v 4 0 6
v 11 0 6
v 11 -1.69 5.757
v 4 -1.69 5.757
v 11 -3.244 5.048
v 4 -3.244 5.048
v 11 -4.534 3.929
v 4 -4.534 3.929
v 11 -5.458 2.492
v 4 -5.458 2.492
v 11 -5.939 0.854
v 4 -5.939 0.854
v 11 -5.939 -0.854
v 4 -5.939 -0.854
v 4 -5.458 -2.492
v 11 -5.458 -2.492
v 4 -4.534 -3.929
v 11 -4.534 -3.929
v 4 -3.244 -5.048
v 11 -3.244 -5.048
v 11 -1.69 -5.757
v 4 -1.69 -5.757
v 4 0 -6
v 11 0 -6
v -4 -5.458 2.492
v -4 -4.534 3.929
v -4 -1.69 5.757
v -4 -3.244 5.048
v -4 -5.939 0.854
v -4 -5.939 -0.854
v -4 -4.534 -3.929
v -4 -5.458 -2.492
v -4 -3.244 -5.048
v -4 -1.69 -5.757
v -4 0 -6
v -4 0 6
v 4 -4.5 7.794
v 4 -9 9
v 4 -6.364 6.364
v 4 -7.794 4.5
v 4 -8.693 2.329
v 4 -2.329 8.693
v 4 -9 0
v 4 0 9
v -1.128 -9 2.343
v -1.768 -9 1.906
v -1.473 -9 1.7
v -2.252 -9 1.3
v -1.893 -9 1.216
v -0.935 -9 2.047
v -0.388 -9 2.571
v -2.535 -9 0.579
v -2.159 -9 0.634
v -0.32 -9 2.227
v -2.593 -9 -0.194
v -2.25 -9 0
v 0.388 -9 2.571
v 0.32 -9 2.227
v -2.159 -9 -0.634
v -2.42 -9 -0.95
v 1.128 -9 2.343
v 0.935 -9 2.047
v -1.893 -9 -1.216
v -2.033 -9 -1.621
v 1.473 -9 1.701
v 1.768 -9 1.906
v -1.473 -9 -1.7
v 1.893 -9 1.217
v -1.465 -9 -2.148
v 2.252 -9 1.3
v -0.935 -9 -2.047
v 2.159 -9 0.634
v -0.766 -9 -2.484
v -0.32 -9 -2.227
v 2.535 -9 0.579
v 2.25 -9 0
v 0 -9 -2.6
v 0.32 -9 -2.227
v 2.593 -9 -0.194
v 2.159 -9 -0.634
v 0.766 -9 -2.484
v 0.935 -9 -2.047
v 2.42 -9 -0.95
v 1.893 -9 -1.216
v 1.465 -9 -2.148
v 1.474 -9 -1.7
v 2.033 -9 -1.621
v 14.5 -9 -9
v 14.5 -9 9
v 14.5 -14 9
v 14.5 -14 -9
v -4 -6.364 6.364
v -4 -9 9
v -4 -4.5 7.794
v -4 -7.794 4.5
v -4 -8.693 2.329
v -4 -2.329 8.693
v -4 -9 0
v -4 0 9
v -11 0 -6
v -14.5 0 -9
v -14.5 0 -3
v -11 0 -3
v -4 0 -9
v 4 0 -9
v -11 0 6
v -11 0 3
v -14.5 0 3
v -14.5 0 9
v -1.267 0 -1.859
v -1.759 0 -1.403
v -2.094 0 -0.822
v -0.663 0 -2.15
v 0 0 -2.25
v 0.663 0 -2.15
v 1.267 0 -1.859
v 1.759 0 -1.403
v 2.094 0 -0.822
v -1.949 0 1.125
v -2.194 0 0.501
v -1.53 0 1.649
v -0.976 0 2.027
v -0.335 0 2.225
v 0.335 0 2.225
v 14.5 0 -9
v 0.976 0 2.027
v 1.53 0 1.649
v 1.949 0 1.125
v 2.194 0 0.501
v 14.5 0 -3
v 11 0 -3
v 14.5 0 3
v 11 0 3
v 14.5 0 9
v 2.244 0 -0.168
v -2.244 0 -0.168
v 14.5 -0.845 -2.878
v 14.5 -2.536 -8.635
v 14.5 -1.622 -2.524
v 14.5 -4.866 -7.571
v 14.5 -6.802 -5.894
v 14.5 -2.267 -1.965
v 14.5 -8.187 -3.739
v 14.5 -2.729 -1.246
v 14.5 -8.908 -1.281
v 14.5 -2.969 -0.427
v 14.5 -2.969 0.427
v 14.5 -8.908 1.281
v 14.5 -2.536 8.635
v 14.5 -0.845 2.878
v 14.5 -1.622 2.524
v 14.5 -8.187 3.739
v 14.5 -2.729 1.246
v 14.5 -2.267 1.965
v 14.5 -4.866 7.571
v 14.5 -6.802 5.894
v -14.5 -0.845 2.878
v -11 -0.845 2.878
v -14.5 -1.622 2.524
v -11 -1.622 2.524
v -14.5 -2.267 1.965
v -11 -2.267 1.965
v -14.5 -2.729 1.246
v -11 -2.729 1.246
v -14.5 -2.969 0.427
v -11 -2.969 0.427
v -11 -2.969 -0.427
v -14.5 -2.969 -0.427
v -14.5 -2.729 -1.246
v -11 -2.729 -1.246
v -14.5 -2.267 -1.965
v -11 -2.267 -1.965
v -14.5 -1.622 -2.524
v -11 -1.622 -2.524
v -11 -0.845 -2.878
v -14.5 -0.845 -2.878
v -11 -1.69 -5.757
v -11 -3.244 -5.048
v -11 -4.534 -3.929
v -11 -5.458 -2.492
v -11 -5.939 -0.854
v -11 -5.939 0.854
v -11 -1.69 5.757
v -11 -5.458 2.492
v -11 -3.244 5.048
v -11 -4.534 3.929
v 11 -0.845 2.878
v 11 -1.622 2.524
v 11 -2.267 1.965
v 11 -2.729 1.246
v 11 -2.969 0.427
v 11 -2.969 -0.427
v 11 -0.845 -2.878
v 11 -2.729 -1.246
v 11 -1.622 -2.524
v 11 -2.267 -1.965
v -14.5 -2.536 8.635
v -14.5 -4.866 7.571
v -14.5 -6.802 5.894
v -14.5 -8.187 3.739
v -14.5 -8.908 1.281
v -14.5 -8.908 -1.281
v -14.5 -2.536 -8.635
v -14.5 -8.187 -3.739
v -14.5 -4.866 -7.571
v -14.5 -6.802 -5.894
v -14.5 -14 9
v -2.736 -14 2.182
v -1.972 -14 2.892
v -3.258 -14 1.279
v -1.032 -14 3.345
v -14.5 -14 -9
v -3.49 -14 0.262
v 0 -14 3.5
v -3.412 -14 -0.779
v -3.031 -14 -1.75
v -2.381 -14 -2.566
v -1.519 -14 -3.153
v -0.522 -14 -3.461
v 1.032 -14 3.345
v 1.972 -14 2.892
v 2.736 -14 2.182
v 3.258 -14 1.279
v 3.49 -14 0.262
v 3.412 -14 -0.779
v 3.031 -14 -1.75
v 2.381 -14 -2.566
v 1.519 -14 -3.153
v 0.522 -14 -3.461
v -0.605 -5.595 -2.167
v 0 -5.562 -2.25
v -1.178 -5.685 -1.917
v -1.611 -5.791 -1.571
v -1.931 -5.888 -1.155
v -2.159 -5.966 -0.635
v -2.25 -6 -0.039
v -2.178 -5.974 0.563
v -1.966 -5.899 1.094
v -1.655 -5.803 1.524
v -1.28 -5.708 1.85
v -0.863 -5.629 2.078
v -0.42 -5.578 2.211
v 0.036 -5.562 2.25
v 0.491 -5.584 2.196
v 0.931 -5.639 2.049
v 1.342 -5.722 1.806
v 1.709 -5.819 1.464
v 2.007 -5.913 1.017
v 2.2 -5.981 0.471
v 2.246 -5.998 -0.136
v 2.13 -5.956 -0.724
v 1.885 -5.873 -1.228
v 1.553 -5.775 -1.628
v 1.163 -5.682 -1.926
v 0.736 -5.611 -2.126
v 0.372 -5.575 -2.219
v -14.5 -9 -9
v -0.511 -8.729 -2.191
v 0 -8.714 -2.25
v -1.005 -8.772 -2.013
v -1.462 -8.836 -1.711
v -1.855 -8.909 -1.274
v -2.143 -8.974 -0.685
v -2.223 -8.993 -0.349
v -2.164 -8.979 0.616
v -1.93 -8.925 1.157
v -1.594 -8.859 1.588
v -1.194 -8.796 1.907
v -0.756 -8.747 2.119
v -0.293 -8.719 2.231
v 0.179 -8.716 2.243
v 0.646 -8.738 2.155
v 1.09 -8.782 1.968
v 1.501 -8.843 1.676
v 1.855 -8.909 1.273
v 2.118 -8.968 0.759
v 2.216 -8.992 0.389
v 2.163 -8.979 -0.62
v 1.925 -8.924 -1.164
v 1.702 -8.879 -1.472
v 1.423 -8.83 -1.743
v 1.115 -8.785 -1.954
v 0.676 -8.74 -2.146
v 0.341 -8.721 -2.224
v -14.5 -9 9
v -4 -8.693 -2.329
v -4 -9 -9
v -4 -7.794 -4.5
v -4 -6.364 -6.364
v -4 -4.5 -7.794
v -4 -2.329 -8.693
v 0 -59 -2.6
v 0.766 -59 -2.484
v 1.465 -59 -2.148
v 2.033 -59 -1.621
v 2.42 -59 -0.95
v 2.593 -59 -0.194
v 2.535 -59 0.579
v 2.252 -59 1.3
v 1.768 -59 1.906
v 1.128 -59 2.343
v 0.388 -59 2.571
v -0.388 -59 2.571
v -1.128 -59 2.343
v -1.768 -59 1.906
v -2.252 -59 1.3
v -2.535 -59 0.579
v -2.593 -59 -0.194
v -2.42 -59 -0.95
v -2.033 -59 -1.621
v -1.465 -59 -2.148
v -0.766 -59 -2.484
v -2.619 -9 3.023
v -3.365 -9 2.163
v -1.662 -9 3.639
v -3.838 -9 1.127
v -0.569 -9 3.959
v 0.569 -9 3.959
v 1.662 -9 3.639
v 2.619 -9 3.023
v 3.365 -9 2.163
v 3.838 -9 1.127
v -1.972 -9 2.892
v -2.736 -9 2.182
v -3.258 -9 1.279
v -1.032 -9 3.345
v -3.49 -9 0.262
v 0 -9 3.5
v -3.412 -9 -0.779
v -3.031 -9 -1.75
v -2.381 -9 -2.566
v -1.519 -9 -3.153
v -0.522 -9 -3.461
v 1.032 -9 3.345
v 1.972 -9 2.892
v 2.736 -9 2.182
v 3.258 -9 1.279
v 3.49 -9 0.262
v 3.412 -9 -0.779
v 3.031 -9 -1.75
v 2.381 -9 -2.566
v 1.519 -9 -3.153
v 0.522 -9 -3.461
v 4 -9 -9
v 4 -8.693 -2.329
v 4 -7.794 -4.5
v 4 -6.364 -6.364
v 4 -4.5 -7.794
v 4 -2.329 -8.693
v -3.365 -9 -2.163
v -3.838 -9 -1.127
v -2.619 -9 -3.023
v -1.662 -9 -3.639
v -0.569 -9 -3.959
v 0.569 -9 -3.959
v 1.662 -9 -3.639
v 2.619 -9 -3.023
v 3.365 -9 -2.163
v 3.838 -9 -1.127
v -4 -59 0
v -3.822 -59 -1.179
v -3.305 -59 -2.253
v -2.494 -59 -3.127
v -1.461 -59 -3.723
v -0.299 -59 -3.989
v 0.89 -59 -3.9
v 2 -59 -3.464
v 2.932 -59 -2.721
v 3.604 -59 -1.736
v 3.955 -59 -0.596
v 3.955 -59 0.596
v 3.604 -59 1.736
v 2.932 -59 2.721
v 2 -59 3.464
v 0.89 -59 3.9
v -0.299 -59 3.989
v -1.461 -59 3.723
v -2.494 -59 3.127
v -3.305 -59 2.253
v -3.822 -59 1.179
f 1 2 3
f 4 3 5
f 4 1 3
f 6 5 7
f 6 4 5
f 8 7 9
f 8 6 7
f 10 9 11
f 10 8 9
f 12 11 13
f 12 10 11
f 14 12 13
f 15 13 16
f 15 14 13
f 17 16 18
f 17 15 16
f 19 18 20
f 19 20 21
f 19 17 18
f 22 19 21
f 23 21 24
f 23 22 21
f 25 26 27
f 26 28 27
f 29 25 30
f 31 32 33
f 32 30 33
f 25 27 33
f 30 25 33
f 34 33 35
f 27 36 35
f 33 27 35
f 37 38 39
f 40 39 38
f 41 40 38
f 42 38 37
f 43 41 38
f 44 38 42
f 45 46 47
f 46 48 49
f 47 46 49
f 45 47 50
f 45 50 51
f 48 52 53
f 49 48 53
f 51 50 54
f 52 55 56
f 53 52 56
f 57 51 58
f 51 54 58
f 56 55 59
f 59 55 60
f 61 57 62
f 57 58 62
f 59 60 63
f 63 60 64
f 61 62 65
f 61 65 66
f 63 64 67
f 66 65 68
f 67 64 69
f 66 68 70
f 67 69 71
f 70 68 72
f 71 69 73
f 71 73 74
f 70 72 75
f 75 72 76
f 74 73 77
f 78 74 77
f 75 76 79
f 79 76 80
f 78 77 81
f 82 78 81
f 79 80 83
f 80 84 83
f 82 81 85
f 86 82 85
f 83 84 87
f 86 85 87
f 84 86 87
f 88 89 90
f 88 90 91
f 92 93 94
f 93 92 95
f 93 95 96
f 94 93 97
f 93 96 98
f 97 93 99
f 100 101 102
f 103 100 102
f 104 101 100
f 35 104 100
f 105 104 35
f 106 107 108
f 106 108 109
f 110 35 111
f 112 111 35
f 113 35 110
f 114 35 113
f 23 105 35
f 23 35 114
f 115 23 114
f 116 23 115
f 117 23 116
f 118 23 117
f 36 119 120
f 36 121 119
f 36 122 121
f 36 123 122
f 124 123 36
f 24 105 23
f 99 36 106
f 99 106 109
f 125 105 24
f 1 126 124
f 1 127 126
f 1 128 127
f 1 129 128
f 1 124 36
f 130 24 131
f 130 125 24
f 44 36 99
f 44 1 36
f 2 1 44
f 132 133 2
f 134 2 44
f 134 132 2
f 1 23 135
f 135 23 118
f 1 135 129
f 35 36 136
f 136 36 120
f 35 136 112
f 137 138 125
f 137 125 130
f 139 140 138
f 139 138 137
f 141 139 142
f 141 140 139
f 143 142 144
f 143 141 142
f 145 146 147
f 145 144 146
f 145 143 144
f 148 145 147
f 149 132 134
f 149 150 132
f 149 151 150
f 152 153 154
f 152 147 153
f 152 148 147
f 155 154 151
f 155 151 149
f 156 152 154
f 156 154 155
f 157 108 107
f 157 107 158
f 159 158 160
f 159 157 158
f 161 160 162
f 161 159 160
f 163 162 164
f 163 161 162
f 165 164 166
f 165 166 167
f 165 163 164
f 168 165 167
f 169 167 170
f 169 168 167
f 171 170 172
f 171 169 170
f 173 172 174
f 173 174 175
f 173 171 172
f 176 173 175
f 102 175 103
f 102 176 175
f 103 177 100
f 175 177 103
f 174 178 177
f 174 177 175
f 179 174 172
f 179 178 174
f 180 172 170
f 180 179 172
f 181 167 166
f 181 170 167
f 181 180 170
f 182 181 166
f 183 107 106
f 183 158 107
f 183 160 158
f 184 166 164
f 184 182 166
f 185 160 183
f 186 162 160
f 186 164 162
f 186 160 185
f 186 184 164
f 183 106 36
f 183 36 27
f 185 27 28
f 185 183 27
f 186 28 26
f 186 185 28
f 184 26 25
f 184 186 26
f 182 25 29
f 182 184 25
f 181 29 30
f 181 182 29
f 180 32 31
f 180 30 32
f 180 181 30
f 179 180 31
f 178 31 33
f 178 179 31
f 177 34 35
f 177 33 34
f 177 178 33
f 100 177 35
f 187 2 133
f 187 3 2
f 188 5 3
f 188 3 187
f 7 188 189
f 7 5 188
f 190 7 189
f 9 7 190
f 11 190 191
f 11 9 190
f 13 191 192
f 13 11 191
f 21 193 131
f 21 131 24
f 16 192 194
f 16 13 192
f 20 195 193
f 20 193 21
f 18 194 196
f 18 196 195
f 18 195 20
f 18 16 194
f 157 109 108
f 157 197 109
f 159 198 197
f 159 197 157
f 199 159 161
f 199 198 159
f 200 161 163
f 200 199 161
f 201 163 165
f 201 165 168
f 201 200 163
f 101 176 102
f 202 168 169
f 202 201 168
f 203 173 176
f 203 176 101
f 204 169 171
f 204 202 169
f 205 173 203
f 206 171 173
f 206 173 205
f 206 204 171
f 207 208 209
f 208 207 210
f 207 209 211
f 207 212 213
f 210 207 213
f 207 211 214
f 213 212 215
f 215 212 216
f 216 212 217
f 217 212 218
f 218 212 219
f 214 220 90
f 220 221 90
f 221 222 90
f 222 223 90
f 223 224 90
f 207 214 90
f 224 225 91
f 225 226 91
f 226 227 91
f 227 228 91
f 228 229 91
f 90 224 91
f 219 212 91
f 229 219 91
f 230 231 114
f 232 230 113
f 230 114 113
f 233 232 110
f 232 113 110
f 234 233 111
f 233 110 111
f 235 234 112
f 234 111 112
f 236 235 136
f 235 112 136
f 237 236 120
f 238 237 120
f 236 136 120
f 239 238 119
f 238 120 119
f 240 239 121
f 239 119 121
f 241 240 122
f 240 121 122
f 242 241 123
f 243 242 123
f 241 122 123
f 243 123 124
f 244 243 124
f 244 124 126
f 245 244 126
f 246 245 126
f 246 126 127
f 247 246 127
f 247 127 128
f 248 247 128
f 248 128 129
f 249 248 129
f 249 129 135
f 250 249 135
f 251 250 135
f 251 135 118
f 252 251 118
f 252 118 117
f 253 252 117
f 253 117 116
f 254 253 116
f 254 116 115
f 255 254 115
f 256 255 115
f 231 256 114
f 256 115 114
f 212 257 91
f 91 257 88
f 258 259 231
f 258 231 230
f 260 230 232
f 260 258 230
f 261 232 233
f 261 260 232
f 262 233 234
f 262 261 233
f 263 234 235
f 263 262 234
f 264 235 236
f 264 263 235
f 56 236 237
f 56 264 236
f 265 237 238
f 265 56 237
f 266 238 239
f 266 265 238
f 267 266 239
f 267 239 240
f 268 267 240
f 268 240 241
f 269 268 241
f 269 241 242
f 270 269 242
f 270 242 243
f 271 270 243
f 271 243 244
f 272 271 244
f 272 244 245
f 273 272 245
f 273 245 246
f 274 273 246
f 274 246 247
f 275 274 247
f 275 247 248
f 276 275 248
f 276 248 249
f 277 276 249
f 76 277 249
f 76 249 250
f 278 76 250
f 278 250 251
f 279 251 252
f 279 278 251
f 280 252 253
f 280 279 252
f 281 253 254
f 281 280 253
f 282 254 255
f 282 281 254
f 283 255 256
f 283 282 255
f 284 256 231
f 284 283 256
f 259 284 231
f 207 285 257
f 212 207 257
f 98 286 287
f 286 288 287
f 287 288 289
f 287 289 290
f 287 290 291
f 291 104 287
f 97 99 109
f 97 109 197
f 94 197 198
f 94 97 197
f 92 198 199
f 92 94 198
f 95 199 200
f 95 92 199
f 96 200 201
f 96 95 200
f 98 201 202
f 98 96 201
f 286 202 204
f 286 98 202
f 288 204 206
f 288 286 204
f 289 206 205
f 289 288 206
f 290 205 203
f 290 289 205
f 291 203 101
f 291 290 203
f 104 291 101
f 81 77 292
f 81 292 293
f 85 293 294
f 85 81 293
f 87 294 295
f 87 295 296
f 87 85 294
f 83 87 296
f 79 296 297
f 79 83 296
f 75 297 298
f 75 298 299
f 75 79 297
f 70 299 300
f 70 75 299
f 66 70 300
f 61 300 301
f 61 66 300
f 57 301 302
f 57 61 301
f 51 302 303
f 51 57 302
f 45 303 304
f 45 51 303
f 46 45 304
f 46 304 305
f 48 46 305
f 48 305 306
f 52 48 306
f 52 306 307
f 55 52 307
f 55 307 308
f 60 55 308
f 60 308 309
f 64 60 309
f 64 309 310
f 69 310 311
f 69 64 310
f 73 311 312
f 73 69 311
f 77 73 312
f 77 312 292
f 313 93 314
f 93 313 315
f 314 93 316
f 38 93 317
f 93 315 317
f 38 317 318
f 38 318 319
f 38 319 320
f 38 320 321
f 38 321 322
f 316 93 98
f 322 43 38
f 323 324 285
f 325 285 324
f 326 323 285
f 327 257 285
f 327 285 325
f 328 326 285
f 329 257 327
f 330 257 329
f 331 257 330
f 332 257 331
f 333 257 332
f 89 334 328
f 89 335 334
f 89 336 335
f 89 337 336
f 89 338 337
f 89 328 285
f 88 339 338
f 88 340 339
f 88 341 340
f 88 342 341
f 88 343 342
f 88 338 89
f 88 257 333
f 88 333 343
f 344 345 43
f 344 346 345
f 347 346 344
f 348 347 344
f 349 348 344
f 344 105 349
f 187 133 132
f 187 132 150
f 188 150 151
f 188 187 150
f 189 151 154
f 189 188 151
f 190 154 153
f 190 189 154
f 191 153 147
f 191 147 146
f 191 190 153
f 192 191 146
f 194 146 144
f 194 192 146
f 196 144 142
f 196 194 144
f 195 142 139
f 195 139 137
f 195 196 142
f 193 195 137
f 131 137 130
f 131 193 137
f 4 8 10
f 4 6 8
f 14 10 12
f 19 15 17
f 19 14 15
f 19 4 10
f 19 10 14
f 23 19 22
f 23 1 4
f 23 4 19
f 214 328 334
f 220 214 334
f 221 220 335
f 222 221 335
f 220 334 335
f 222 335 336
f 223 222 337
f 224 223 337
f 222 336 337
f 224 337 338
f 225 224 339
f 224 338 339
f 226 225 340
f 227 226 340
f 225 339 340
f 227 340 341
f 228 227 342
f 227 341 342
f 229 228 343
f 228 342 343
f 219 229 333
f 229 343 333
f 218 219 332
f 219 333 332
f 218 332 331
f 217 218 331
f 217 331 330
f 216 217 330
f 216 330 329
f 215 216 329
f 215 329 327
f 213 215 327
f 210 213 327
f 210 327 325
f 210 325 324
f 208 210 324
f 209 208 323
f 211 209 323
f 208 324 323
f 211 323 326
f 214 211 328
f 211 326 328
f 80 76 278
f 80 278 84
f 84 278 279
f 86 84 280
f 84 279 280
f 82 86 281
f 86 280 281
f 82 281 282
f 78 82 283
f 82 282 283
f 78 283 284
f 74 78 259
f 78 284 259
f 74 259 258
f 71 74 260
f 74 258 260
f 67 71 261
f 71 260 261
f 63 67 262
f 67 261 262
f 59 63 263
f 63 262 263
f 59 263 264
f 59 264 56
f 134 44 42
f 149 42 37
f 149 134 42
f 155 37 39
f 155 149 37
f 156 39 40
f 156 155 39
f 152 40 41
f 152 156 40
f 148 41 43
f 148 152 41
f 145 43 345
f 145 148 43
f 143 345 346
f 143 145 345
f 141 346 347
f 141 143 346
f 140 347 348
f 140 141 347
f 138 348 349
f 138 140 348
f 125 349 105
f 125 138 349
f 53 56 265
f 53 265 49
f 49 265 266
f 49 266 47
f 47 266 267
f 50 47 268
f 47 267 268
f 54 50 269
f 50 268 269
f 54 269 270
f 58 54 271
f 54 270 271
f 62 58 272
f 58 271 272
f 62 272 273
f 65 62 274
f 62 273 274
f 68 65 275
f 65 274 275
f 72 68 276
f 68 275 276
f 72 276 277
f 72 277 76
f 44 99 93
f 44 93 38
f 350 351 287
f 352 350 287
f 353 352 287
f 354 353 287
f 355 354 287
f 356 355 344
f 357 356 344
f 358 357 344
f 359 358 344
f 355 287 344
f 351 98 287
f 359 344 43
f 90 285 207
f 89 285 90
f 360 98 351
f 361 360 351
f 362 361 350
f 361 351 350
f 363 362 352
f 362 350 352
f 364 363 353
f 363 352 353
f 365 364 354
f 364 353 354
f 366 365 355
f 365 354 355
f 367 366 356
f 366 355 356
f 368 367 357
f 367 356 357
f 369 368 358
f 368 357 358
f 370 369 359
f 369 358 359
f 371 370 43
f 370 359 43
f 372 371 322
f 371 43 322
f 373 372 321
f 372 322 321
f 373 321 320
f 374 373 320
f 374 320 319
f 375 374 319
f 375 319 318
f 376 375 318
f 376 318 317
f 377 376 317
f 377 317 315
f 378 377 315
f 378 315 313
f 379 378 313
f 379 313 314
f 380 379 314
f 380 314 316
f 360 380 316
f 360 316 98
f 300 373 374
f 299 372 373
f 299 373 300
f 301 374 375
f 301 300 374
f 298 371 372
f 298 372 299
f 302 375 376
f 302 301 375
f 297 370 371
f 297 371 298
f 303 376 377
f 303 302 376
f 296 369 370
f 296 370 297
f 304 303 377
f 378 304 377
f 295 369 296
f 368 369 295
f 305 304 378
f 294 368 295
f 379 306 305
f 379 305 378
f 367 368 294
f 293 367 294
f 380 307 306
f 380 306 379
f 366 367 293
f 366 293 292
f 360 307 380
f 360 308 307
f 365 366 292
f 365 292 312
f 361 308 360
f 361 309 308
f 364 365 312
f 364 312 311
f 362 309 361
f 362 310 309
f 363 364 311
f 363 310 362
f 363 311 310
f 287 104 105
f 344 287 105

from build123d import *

# Parameters (mm, degrees)
CUT_EXTRUDE1_DEPTH      = 10
CUT_EXTRUDE1_DEPTH_BACK = 10
SKETCH4_R               = 2.25
SKETCH4_5_W             = 8
SKETCH4_5_H             = 18
SKETCH4_5_R             = 2.25
BOSS_EXTRUDE1_DEPTH     = 9
CUT_EXTRUDE2_DEPTH      = 32.670175393
CUT_EXTRUDE2_DEPTH_BACK = 32.670175393
SKETCH6_R               = 4
SKETCH6_R_2             = 2.6
BOSS_EXTRUDE2_DEPTH     = 50
BOSS_EXTRUDE4_START     = -9
SKETCH7_W               = 29
SKETCH7_H               = 18
SKETCH7_R               = 3.5
BOSS_EXTRUDE4_DEPTH     = 5


with BuildPart() as part:
    # Sketch1 → Revolve1 (revolve)
    with BuildSketch(Plane.XY, mode=Mode.PRIVATE) as revolve1_sk:
        Polygon((-14.5, 9), (14.5, 9), (14.5, 3), (11, 3), (11, 6), (-11, 6), (-11, 3), (-14.5, 3), align=None)
    revolve(revolve1_sk.sketch.rotate(Axis((-39.087837838, 0, 0), (1, 0, 0)), 90), axis=Axis((-39.087837838, 0, 0), (1, 0, 0)))

    # Sketch4 → Cut-Extrude1 (cut, two sides: drawn at the far end of the back side and taken through both)
    with BuildSketch(Plane(origin=(0, 0, 0), x_dir=(1, 0, 0), z_dir=(0, 1, 0)).offset(-CUT_EXTRUDE1_DEPTH_BACK)):
        with Locations(Location((0, 0, 0), (0, 0, 90))):
            Circle(SKETCH4_R)
    extrude(amount=CUT_EXTRUDE1_DEPTH + CUT_EXTRUDE1_DEPTH_BACK, mode=Mode.SUBTRACT)

    # Sketch4<5> → Boss-Extrude1 (add, through all)
    with BuildSketch(Plane(origin=(0, 0, 0), x_dir=(1, 0, 0), z_dir=(0, 1, 0))):
        Rectangle(SKETCH4_5_W, SKETCH4_5_H)
        with Locations(Location((0, 0, 0), (0, 0, 90))):
            Circle(SKETCH4_5_R, mode=Mode.SUBTRACT)
    extrude(amount=-BOSS_EXTRUDE1_DEPTH)

    # Sketch5 → Cut-Extrude2 (cut, two sides: drawn at the far end of the back side and taken through both)
    with BuildSketch(Plane.ZY.offset(14.5).offset(-CUT_EXTRUDE2_DEPTH_BACK)):
        Polygon((-61.985560785, 0), (-9.284472497, 0), (10.360933076, 0), (63.062021365, 0), (63.062021365, 105.402176578), (-61.985560785, 105.402176578), align=None)
    extrude(amount=CUT_EXTRUDE2_DEPTH + CUT_EXTRUDE2_DEPTH_BACK, mode=Mode.SUBTRACT)

    # Sketch6 → Boss-Extrude2 (add)
    with BuildSketch(Plane.XZ.offset(9)):
        with Locations(Location((0, 0, 0), (0, 0, 180))):
            Circle(SKETCH6_R)
        with Locations(Location((0, 0, 0), (0, 0, 270))):
            Circle(SKETCH6_R_2, mode=Mode.SUBTRACT)
    extrude(amount=BOSS_EXTRUDE2_DEPTH)


with BuildPart() as body_2:
    # Sketch7 → Boss-Extrude4 (new body)
    with BuildSketch(Plane(origin=(0, 0, 0), x_dir=(1, 0, 0), z_dir=(0, 1, 0)).offset(BOSS_EXTRUDE4_START)):
        Rectangle(SKETCH7_W, SKETCH7_H)
        with Locations(Location((0, 0, 0), (0, 0, 270))):
            Circle(SKETCH7_R, mode=Mode.SUBTRACT)
    extrude(amount=-BOSS_EXTRUDE4_DEPTH)


solid = Compound([part.part, body_2.part])
